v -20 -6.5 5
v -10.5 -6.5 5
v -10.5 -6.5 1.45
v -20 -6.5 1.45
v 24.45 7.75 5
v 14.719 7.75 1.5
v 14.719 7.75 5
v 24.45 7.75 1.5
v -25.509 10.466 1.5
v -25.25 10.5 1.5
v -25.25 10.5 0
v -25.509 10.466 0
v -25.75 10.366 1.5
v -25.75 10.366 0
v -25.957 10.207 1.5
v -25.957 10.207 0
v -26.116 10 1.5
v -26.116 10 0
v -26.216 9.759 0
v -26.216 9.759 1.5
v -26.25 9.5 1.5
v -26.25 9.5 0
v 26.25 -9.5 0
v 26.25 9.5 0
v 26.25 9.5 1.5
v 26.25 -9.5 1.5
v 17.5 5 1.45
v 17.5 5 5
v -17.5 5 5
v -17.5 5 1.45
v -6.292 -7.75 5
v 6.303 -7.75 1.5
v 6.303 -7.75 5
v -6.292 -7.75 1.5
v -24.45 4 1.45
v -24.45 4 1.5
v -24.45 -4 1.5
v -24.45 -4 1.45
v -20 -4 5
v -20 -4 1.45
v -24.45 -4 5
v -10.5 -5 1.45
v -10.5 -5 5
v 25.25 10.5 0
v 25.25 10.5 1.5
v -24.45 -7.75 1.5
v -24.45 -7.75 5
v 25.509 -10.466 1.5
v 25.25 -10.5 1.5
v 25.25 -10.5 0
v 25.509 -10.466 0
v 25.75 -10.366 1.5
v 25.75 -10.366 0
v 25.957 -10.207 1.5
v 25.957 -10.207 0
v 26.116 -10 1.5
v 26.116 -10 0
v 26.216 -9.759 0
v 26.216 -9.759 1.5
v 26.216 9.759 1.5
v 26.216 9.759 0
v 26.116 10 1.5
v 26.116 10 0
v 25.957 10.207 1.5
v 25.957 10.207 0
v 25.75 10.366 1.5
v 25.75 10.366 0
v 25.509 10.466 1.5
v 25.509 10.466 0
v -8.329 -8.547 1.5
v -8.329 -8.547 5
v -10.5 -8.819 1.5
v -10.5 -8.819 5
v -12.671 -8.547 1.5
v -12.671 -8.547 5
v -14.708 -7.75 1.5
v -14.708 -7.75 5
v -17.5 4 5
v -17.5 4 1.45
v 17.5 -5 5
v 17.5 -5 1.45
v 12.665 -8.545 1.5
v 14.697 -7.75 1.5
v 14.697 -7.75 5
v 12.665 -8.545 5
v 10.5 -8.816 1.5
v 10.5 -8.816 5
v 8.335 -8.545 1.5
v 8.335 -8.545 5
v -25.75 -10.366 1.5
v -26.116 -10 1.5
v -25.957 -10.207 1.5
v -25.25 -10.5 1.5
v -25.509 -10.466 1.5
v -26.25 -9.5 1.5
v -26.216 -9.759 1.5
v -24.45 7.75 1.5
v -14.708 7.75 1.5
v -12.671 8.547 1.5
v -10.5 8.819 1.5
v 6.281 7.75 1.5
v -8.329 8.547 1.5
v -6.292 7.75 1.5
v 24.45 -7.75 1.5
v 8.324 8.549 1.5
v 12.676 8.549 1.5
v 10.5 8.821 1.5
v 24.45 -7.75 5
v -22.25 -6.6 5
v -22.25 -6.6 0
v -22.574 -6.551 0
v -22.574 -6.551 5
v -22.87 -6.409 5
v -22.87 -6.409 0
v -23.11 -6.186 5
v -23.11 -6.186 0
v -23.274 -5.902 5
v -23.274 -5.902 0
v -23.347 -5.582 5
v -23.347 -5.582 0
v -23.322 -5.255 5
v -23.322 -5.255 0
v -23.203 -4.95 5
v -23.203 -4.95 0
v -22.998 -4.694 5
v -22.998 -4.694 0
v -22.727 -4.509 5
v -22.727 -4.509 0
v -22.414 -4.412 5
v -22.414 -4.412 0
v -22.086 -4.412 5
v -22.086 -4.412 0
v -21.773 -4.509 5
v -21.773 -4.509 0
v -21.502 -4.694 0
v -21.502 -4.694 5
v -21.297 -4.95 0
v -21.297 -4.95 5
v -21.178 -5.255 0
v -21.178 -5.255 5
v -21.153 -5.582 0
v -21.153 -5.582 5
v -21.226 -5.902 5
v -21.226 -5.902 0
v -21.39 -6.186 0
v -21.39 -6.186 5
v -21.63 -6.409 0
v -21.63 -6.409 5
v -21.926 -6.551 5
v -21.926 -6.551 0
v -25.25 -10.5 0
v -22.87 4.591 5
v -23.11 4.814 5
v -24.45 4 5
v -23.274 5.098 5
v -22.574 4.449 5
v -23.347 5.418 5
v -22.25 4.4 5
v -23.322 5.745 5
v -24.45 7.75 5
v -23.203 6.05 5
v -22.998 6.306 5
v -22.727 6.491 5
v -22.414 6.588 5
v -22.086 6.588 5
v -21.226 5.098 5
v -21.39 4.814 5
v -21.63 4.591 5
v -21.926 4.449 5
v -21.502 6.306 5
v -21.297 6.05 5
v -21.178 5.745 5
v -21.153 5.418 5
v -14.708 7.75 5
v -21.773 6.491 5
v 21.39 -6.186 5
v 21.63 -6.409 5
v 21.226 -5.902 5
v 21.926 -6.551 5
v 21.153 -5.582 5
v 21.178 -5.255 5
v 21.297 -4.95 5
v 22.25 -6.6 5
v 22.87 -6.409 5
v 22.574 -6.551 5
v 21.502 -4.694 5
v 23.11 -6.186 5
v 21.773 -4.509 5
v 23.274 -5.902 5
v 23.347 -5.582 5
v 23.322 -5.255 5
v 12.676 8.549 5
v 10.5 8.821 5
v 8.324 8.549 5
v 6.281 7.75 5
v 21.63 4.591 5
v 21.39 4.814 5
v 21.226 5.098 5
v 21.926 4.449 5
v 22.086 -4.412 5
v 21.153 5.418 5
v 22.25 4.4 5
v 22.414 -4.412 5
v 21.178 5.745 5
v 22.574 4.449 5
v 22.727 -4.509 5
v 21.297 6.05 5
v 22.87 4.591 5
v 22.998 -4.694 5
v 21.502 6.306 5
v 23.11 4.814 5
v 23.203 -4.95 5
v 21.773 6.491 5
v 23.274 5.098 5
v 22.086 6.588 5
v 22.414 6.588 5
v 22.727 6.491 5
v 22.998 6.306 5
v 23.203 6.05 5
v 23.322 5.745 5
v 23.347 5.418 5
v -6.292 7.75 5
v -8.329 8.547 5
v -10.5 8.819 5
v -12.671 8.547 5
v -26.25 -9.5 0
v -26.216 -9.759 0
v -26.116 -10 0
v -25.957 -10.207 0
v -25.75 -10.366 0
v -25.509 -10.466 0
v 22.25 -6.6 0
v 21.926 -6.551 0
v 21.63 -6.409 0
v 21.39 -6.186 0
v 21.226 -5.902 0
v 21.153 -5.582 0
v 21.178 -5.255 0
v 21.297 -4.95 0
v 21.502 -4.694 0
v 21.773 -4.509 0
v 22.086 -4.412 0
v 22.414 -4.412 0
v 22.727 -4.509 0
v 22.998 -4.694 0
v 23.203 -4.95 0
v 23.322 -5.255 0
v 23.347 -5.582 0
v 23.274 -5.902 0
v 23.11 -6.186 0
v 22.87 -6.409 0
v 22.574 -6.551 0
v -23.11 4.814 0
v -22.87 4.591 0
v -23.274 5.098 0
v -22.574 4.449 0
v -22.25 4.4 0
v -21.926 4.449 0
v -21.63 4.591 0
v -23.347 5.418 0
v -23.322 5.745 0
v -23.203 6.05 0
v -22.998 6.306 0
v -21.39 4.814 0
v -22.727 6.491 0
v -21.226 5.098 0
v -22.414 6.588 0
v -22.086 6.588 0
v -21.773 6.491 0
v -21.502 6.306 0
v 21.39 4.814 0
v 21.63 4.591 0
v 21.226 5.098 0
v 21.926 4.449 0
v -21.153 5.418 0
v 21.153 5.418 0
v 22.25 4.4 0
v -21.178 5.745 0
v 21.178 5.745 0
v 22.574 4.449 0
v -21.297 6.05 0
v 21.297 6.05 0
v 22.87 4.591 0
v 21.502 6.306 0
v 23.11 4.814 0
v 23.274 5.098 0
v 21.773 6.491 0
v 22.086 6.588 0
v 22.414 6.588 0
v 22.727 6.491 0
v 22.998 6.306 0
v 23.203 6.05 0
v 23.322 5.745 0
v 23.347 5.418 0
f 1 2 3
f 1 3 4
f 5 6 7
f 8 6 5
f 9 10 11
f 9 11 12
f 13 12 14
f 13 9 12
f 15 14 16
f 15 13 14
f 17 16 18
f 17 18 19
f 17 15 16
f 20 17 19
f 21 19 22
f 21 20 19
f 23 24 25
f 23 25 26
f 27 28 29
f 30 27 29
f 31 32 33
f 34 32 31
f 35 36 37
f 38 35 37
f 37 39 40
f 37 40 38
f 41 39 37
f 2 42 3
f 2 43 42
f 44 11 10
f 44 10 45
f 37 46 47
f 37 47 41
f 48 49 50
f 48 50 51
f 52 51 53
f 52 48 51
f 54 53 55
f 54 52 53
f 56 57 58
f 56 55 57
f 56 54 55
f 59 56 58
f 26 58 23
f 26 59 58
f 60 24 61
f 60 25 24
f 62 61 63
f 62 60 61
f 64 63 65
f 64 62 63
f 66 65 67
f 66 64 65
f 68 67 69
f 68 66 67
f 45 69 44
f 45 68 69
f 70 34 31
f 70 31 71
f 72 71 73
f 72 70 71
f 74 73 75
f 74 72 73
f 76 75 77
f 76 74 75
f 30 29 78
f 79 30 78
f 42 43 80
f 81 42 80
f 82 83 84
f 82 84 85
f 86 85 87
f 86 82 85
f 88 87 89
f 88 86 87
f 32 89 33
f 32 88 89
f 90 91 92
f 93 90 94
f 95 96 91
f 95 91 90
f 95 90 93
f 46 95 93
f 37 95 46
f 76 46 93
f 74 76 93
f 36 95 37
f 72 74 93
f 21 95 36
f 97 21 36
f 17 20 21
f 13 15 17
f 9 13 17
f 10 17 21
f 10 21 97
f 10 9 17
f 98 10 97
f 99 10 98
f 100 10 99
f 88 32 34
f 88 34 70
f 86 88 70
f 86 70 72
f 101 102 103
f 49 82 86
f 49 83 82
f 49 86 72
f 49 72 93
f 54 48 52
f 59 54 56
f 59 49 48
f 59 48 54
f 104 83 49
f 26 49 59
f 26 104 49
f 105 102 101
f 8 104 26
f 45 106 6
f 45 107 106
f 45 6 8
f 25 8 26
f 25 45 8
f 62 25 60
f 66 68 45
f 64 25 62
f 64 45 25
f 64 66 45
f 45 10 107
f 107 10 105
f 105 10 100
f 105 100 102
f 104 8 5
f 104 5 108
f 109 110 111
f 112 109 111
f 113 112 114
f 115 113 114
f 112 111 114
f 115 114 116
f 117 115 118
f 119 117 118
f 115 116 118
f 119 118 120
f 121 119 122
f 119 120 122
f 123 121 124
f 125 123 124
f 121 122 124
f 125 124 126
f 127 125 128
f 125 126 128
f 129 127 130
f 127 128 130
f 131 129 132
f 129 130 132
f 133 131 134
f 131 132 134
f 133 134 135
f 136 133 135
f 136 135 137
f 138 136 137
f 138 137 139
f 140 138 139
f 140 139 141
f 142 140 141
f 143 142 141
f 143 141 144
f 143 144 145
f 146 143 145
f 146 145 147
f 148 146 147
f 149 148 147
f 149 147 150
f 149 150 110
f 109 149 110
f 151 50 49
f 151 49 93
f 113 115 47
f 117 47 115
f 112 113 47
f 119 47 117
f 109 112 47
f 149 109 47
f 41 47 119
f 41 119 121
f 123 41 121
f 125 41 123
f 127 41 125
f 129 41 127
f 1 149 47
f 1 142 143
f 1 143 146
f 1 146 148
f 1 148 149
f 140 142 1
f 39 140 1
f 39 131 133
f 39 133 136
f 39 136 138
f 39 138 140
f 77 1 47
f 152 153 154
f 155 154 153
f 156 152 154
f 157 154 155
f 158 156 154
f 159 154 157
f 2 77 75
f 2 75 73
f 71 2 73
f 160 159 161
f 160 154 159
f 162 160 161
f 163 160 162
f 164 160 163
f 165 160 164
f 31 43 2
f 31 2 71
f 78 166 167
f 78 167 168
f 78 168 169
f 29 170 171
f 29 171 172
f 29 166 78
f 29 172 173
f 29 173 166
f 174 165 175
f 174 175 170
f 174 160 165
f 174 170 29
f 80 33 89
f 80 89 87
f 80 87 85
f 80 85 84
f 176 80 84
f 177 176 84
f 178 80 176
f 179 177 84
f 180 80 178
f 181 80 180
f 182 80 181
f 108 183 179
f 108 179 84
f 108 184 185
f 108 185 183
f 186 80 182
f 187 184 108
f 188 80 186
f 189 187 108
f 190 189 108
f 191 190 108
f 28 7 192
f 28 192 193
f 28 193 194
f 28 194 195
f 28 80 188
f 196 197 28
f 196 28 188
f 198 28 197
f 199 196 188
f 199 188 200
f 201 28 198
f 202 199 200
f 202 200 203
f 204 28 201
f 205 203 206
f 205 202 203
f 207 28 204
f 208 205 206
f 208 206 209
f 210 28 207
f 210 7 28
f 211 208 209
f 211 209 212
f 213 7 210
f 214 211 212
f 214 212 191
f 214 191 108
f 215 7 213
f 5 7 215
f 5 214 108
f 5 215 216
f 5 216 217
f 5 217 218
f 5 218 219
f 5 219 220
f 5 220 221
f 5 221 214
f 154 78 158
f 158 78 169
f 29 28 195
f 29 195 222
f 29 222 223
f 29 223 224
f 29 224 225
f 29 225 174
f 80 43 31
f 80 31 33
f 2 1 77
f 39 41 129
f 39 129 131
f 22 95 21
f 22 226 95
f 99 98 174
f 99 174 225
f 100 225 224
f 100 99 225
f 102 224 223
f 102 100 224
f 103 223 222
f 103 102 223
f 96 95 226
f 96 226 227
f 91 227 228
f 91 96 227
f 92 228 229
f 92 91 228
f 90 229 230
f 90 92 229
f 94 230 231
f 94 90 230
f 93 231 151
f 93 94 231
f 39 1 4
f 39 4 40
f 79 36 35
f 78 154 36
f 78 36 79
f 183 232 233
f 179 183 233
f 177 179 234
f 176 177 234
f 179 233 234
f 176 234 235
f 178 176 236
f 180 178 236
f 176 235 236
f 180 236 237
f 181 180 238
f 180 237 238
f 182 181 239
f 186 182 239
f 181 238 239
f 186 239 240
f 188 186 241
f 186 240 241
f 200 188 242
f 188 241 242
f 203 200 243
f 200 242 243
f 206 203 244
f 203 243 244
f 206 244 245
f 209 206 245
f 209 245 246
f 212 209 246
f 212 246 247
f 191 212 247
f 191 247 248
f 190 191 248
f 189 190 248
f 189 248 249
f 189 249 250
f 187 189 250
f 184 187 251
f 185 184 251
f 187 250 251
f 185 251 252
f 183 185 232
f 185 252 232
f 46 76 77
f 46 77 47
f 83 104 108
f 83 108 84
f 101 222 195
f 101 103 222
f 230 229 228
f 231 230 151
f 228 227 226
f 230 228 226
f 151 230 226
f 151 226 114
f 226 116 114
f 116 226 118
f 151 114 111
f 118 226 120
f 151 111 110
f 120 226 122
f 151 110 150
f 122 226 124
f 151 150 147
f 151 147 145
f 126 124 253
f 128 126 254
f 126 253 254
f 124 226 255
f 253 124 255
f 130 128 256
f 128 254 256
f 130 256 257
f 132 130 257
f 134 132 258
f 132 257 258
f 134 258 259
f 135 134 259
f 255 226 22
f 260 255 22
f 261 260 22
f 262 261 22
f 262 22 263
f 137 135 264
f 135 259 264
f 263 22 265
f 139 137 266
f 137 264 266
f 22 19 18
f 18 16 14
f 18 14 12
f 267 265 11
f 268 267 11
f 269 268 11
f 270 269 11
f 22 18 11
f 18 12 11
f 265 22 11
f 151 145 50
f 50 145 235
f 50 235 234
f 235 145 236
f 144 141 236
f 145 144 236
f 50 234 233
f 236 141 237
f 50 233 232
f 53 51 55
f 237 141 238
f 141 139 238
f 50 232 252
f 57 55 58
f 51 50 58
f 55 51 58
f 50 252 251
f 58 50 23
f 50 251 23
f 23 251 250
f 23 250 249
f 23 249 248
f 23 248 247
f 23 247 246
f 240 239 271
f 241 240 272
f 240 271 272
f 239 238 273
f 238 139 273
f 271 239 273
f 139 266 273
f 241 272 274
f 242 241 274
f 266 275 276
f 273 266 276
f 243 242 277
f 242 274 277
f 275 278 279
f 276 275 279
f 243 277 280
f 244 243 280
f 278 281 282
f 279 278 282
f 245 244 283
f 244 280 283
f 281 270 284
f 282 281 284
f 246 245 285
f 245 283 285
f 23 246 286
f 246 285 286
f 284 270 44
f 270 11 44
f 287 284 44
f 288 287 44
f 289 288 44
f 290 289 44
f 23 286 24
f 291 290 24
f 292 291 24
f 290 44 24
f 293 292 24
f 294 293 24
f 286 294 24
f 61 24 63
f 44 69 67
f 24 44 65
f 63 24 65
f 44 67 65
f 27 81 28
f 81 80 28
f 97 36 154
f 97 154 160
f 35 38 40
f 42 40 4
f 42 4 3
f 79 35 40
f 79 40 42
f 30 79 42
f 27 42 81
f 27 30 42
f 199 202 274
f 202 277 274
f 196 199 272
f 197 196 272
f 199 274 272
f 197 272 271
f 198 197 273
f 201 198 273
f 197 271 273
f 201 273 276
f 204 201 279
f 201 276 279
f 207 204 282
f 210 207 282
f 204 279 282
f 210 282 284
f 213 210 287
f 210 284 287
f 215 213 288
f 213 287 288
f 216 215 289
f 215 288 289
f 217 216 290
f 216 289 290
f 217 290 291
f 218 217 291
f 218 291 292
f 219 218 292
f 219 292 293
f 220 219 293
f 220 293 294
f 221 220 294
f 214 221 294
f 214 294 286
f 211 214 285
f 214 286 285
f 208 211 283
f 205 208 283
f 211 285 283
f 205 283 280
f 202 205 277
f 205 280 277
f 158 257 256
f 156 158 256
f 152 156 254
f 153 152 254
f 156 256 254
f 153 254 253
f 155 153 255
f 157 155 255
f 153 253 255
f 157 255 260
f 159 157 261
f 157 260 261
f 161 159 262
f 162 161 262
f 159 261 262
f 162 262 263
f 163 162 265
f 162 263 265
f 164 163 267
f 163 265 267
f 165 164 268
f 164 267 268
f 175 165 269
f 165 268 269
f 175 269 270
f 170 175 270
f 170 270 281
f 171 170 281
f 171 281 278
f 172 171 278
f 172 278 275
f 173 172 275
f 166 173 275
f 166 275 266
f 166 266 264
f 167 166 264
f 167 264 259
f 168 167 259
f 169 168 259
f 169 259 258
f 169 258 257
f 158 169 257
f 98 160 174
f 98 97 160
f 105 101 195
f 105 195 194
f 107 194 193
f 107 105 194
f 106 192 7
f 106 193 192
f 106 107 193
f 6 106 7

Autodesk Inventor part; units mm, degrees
ref_plane "YZ Plane" through (0, 0, 0) normal (1, 0, 0) x (0, 1, 0)
ref_plane "XZ Plane" through (0, 0, 0) normal (0, 1, 0) x (-1, 0, 0)
ref_plane "XY Plane" through (0, 0, 0) normal (0, 0, 1) x (1, 0, 0)
sketch "スケッチ1" plane through (0, 0, 0) normal (0, 0, 1) x (1, 0, 0)
  line L0 (-26.25, 10.5) -> (26.25, 10.5)
  line L1 (26.25, 10.5) -> (26.25, -10.5)
  line L2 (26.25, -10.5) -> (-26.25, -10.5)
  line L3 (-26.25, -10.5) -> (-26.25, 10.5)
  point P0 (0, 0)
  dimension "d0" = 52.5
  dimension "d1" = 21
  dimension "d2" = 10.5
  dimension "d3" = 26.25
extrude "押し出し1" add sketch "スケッチ1" along normal blind 1.5
sketch "スケッチ6" plane through (0, 0, 1.5) normal (0, 0, 1) x (1, 0, 0)
  line L0 (-24.45, -7.75) -> (-24.45, 7.75)
  line L1 (24.45, 7.75) -> (24.45, -7.75)
  line L2 (24.45, -7.75) -> (14.6971, -7.75)
  arc A0 (14.7186, 7.75) -> (6.2813, 7.75) centre (10.5, -0.0198) ccw
  arc A1 (6.3028, -7.75) -> (14.6971, -7.75) centre (10.5, -0.0198) ccw
  line L3 (14.7186, 7.75) -> (24.45, 7.75)
  line L4 (6.3028, -7.75) -> (-6.2921, -7.75)
  line L5 (-14.7079, -7.75) -> (-24.45, -7.75)
  arc A2 (-6.2921, 7.75) -> (-14.7079, 7.75) centre (-10.5, 0) ccw
  arc A3 (-14.7079, -7.75) -> (-6.2921, -7.75) centre (-10.5, 0) ccw
  line L6 (-24.45, 7.75) -> (-14.7079, 7.75)
  line L7 (-6.2921, 7.75) -> (6.2813, 7.75)
  point P0 (0, 0)
  dimension "d86" = 48.9
  dimension "d87" = 15.5
  dimension "d89" = 24.45
  dimension "d92" = 10.5
  dimension "d93" = 10.5
  dimension "d97" = 15.5
  dimension "d98" = 7.75
  dimension "d99" = 7.75
  dimension "d100" = 7.75
  dimension "d101" = 7.75
  dimension "d102" = 7.75
  dimension "d103" = 57
  dimension "d104" = 57
  dimension "d105" = 57
  dimension "d106" = 57
extrude "押し出し4" add sketch "スケッチ6" along normal blind 3.5
sketch "スケッチ7" plane through (0, 0, 5) normal (0, 0, 1) x (1, 0, 0)
  point P0 (0, 0)
  point P1 (-22.25, 5.5)
  point P2 (-22.25, -5.5)
  point P3 (22.25, 5.5)
  point P4 (22.25, -5.5)
  dimension "d62" = 44.5
  dimension "d63" = 11
  dimension "d64" = 11
  dimension "d65" = 44.5
  dimension "d66" = 22.25
  dimension "d67" = 5.5
  dimension "d68" = 22.25
  dimension "d69" = 5.5
hole "穴3" at (-22.25, 5.5, 5) at (-22.25, -5.5, 5) at (22.25, 5.5, 5) at (22.25, -5.5, 5) direction (0, 0, -1) diameter 2.2 end through all
fillet "フィレット3" radius 1 4 edges at (-26.25, -10.5, 0.75) (26.25, -10.5, 0.75) (26.25, 10.5, 0.75) (-26.25, 10.5, 0.75)
sketch "スケッチ8" plane through (0, 0, 5) normal (0, 0, 1) x (1, 0, 0)
  line L0 (-10.5, -5) -> (17.5, -5)
  line L1 (17.5, -5) -> (17.5, 5)
  line L2 (17.5, 5) -> (-17.5, 5)
  line L3 (-24.45, 7.75) -> (-24.45, -7.75) projected
  line L4 (-20, -4) -> (-24.45, -4)
  line L5 (-24.45, -4) -> (-24.45, 4)
  line L6 (-24.45, 4) -> (-17.5, 4)
  line L7 (-25.25, -10.5) -> (25.25, -10.5) projected
  line L8 (25.25, 10.5) -> (-25.25, 10.5) projected
  line L9 (-17.5, 5) -> (-17.5, 4)
  line L10 (-10.5, -5) -> (-10.5, -6.5)
  line L11 (-10.5, -6.5) -> (-17.5, -6.5)
  line L12 (-17.5, -6.5) -> (-20, -6.5)
  line L13 (-20, -6.5) -> (-20, -4)
  point P0 (0, 0)
  dimension "d80" = 35
  dimension "d81" = 10
  dimension "d82" = 5
  dimension "d95" = 6.5
  dimension "d109" = 1.5
  dimension "d111" = 9.5
extrude "押し出し5" cut sketch "スケッチ8" against normal blind 3.55
equation "\"d2\" = 0.5 * d1"
equation "\"d3\" = 0.5 * d0"
equation "\"d89\" = 0.5 * d86"
equation "\"d93\" = d92"
equation "\"d98\" = 0.5 * d87"
equation "\"d99\" = 0.5 * d97"
equation "\"d100\" = d98"
equation "\"d101\" = d99"
equation "\"d102\" = 0.5 * d97"
equation "\"d64\" = d63"
equation "\"d65\" = d62"
equation "\"d66\" = 0.5 * d62"
equation "\"d67\" = 0.5 * d64"
equation "\"d68\" = d66"
equation "\"d82\" = 0.5 * d81"
equation "\"d95\" = d94"
equation "\"d20\" = 0.5 * d19"
equation "\"d44\" = 0.5 * d43"
equation "\"d55\" = 0.5 * d53"
equation "\"d83\" = 0.5 * d80"
equation "\"d88\" = 0.5 * d87"
equation "\"d94\" = 6.5"
equation "\"d19\" = 14.8"
equation "\"d43\" = 14.8"
equation "\"d53\" = 14.4"
properties part number "New_Accelite_Controller_Cover_copy_under" material "ABS プラスチック"
